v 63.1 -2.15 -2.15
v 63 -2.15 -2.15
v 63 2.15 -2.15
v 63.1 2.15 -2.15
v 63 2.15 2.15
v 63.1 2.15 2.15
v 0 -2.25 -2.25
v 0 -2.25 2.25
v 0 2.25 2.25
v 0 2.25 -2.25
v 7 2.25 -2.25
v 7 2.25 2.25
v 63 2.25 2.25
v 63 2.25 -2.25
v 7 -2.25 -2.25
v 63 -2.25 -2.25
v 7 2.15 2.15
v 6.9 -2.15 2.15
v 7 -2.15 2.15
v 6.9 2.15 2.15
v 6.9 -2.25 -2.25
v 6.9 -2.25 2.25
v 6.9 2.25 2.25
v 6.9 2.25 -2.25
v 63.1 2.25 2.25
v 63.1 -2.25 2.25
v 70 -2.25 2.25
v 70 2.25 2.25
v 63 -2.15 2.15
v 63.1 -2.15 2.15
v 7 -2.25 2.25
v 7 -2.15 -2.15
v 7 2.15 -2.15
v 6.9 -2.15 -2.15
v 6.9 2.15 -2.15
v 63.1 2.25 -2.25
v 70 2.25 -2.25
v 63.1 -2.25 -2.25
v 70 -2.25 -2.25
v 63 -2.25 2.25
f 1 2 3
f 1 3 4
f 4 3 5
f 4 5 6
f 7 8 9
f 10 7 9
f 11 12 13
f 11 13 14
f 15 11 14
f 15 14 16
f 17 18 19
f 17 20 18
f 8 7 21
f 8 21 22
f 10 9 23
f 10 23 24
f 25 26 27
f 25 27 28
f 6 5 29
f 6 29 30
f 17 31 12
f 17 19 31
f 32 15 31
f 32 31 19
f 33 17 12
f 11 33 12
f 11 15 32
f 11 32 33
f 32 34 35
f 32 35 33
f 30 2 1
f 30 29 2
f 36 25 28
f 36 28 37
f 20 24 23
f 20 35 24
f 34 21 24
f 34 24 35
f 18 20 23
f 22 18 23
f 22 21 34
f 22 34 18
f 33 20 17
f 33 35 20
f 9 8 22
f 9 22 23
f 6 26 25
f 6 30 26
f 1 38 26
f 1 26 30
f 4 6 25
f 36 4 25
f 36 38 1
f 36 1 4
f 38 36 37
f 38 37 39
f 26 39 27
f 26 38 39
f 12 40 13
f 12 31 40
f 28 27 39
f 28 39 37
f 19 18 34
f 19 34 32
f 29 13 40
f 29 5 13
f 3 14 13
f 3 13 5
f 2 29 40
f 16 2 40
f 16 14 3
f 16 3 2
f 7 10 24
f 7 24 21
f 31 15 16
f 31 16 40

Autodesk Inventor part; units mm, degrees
ref_plane "YZ Plane" through (0, 0, 0) normal (1, 0, 0) x (0, 1, 0)
ref_plane "XZ Plane" through (0, 0, 0) normal (0, 1, 0) x (-1, 0, 0)
ref_plane "XY Plane" through (0, 0, 0) normal (0, 0, 1) x (1, 0, 0)
sketch "Эскиз1" plane through (0, 0, 0) normal (1, 0, 0) x (0, 1, 0)
  line L0 (2.25, -2.25) -> (-2.25, -2.25)
  line L1 (-2.25, -2.25) -> (-2.25, 2.25)
  line L2 (-2.25, 2.25) -> (2.25, 2.25)
  line L3 (2.25, 2.25) -> (2.25, -2.25)
  line L4 (2.25, -2.25) -> (-2.25, 2.25) construction
  line L5 (-2.25, -2.25) -> (2.25, 2.25) construction
  point P0 (0, 0)
  dimension "d0" = 4.5
  dimension "d1" = 4.5
extrude "Выдавливание1" add sketch "Эскиз1" along normal blind 70
sketch "Эскиз2" plane through (0, -2.25, 2.25) normal (0, 0, 1) x (1, 0, 0)
  line L0 (0, 4.5) -> (0, 0) projected
  line L1 (0, 0) -> (70, 0) projected
  line L2 (70, 4.5) -> (70, 0) projected
  line L3 (0, 4.5) -> (70, 4.5) projected
  line L4 (6.9, 4.5) -> (7, 4.5)
  line L5 (7, 4.5) -> (7, 0)
  line L6 (7, 0) -> (6.9, 0)
  line L7 (6.9, 0) -> (6.9, 4.5)
  line L8 (63, 4.5) -> (63.1, 4.5)
  line L9 (63.1, 4.5) -> (63.1, 0)
  line L10 (63.1, 0) -> (63, 0)
  line L11 (63, 0) -> (63, 4.5)
  point P0 (0, 2.25)
  point P1 (63, 0)
  point P2 (6.9, 0)
  dimension "d4" = 0.1
  dimension "d5" = 0.1
  dimension "d6" = 6.9
  dimension "d7" = 6.9
extrude "Выдавливание2" cut sketch "Эскиз2" against normal blind 0.1 contours L3 L5 L1 L7 | L3 L9 L1 L11
pattern_circular "Круговой массив1" count 4 over 360 about axis through (-10, 0, 0) along (1, 0, 0) of "Выдавливание2"
sketch "Эскиз3" plane through (70, 0, 0) normal (1, 0, 0) x (0, 0, -1)
  line L0 (-2.25, 2.25) -> (-2.25, -2.25) projected
  line L1 (-2.25, -2.25) -> (2.25, -2.25) projected
  line L2 (2.25, -2.25) -> (2.25, 2.25) projected
  line L3 (2.25, 2.25) -> (-2.25, 2.25) projected
  point P0 (0, 0)
properties part number "Torsion" material "Нейлон 6/6"
